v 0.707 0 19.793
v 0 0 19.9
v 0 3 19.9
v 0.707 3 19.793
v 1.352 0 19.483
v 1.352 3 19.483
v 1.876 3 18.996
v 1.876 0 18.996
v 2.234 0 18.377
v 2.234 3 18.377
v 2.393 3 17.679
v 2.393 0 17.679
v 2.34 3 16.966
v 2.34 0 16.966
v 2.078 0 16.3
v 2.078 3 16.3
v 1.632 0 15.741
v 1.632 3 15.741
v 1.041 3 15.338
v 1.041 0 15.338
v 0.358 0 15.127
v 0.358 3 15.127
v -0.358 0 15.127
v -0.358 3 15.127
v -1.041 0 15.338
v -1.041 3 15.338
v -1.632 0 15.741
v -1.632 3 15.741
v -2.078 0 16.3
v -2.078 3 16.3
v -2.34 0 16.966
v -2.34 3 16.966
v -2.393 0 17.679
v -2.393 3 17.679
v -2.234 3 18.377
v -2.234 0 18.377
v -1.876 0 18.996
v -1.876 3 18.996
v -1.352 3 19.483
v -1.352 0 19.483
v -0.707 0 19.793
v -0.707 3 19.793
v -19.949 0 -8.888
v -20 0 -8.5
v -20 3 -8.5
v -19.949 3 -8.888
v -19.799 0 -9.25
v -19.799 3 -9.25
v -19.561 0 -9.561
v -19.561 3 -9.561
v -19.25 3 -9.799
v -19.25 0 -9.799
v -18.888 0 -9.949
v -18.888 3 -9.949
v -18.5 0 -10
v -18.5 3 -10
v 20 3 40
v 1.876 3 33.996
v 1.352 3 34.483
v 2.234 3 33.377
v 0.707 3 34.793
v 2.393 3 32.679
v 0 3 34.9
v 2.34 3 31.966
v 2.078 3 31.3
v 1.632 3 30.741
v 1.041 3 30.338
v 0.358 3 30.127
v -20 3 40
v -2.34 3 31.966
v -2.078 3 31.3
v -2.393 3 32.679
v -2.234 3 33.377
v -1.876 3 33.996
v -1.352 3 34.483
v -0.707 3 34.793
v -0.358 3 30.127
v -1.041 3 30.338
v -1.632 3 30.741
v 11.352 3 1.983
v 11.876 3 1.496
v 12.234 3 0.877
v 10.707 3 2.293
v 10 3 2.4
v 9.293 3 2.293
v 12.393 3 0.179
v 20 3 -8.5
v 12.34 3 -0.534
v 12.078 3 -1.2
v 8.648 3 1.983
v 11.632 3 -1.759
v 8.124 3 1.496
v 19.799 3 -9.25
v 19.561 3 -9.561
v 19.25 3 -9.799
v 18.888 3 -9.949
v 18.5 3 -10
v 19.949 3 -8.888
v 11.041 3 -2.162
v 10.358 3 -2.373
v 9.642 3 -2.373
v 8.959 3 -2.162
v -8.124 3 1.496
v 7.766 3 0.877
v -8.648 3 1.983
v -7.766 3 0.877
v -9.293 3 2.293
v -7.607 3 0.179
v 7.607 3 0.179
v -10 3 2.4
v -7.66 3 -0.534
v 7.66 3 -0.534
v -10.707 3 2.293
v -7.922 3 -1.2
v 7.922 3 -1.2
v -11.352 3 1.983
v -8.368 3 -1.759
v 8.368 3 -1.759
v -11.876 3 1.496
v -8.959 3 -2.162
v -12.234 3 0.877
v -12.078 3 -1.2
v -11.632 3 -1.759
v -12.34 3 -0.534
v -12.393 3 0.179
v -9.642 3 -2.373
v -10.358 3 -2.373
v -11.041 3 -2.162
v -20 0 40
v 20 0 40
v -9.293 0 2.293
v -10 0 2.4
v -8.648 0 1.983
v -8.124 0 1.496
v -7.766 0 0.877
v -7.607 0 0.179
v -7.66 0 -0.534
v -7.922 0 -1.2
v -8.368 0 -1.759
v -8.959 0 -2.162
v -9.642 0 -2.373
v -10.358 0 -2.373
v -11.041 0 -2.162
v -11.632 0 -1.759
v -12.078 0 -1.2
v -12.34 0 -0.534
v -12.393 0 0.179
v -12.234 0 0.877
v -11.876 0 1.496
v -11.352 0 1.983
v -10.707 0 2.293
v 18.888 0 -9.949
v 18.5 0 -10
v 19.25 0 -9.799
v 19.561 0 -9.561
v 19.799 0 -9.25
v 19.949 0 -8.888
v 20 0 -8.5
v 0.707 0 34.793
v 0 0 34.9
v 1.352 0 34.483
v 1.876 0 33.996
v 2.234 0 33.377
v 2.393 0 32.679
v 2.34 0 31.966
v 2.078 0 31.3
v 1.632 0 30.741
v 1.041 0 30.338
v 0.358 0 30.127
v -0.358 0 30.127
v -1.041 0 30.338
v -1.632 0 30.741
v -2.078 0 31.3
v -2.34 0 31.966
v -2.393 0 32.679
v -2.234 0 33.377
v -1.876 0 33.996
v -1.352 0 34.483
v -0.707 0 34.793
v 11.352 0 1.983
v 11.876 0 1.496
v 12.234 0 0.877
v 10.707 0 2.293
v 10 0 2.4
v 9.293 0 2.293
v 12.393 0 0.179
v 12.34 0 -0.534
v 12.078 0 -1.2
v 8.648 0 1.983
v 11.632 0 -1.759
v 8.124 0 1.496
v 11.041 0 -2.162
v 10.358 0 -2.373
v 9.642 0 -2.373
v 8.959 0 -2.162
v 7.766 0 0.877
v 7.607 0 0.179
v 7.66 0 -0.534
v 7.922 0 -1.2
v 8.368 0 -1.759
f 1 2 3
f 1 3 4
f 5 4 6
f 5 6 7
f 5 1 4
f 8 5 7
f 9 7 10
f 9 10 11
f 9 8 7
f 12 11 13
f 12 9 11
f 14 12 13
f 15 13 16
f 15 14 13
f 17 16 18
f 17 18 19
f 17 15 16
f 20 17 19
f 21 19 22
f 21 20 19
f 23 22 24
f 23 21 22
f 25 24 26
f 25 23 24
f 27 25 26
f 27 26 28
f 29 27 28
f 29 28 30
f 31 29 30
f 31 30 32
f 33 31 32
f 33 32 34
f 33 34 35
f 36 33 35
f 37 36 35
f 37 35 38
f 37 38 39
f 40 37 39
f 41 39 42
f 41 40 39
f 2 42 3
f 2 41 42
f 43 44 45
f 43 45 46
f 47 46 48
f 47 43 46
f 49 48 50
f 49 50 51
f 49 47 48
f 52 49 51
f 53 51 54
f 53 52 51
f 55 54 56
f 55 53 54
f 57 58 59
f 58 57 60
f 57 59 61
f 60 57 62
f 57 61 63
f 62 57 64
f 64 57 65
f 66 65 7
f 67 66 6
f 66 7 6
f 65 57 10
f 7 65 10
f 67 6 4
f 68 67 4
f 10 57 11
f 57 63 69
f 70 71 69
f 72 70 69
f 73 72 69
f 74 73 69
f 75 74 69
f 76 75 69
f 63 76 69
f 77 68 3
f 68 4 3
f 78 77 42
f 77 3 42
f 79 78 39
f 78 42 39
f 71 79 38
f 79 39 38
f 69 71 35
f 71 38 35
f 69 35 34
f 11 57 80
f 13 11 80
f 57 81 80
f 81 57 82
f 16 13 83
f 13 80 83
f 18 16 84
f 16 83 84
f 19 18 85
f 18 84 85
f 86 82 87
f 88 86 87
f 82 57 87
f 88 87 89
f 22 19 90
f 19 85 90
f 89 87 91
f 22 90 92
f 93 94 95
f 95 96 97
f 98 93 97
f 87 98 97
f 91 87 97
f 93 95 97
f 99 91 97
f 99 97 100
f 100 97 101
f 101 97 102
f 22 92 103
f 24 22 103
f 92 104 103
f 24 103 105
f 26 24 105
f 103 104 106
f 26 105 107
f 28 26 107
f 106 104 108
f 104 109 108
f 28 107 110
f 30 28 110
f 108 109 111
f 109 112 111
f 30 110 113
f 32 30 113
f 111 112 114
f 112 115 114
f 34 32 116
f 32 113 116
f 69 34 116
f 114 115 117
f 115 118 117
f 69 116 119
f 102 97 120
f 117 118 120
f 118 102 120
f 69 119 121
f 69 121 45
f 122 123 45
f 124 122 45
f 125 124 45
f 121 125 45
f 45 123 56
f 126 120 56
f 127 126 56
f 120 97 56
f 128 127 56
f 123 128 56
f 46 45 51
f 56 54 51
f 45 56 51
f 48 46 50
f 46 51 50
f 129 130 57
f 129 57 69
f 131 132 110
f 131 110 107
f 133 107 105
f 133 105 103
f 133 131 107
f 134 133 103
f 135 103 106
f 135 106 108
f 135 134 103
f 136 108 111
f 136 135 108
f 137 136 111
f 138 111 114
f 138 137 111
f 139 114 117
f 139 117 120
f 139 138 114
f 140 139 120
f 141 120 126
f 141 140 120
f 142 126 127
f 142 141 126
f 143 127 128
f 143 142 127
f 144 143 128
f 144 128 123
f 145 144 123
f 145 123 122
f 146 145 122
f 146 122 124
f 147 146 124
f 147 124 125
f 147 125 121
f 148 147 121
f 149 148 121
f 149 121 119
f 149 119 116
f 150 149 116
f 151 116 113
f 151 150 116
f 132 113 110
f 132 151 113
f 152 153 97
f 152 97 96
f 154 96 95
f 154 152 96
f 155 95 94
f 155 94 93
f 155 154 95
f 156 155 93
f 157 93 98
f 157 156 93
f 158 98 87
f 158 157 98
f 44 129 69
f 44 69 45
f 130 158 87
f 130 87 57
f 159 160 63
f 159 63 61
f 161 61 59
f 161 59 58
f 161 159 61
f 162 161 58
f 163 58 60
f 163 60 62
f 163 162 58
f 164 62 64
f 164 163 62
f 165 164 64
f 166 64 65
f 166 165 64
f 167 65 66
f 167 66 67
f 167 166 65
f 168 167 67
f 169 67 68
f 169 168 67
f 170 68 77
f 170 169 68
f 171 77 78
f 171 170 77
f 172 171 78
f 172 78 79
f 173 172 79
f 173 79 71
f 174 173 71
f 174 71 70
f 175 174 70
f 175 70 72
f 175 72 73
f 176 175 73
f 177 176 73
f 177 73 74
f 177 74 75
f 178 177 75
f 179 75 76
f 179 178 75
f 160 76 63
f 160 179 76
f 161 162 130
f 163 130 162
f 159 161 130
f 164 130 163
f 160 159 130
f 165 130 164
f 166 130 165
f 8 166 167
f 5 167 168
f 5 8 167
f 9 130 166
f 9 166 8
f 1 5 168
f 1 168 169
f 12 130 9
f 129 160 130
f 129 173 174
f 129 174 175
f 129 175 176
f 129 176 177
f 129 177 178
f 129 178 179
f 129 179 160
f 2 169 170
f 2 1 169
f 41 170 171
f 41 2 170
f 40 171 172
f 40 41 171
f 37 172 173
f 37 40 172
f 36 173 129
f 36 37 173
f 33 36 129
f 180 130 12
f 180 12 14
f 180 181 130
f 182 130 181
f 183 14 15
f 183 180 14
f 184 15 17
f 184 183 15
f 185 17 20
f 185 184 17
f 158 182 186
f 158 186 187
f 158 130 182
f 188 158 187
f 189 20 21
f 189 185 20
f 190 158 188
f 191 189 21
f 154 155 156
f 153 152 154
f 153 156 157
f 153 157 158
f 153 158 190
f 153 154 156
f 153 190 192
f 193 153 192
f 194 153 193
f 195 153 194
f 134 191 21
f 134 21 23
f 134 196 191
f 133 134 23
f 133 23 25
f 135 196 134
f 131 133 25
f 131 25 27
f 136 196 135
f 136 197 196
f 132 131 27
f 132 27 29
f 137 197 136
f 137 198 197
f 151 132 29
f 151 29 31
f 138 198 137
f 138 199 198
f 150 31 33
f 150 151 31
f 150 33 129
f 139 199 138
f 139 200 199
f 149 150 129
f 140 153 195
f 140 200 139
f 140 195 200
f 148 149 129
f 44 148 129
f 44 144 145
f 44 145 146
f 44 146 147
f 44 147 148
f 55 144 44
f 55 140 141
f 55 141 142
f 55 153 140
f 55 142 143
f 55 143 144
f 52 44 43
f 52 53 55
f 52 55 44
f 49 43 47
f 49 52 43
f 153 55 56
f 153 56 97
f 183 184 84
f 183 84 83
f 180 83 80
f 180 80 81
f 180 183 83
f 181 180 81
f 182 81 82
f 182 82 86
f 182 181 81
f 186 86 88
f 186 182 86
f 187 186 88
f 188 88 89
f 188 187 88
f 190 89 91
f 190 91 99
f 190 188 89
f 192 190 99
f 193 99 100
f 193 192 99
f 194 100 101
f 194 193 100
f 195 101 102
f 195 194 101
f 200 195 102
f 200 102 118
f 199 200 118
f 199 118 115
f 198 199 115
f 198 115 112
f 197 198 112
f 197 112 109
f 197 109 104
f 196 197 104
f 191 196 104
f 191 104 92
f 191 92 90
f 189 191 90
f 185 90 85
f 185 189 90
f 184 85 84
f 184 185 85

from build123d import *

# Parameters (mm, degrees)
SKETCH1_R           = 2.4
BOSS_EXTRUDE1_DEPTH = 3


with BuildPart() as part:
    # Sketch1 → Boss-Extrude1 (new body)
    with BuildSketch(Plane(origin=(0, 0, 0), x_dir=(1, 0, 0), z_dir=(0, 1, 0))):
        with BuildLine():
            Line((-18.5, 10), (18.5, 10))
            ThreePointArc((18.5, 10), (19.560660172, 9.560660172), (20, 8.5))
            Line((20, 8.5), (20, -40))
            Line((20, -40), (-20, -40))
            Line((-20, -40), (-20, 8.5))
            ThreePointArc((-20, 8.5), (-19.560660172, 9.560660172), (-18.5, 10))
        make_face()
        with Locations(Location((-10, 0, 0), (0, 0, 270))):
            Circle(SKETCH1_R, mode=Mode.SUBTRACT)
        with Locations(Location((10, 0, 0), (0, 0, 270))):
            Circle(SKETCH1_R, mode=Mode.SUBTRACT)
        with Locations(Location((0, -32.5, 0), (0, 0, 270))):
            Circle(SKETCH1_R, mode=Mode.SUBTRACT)
        with Locations(Location((0, -17.5, 0), (0, 0, 270))):
            Circle(SKETCH1_R, mode=Mode.SUBTRACT)
    extrude(amount=BOSS_EXTRUDE1_DEPTH)


solid = part.part
